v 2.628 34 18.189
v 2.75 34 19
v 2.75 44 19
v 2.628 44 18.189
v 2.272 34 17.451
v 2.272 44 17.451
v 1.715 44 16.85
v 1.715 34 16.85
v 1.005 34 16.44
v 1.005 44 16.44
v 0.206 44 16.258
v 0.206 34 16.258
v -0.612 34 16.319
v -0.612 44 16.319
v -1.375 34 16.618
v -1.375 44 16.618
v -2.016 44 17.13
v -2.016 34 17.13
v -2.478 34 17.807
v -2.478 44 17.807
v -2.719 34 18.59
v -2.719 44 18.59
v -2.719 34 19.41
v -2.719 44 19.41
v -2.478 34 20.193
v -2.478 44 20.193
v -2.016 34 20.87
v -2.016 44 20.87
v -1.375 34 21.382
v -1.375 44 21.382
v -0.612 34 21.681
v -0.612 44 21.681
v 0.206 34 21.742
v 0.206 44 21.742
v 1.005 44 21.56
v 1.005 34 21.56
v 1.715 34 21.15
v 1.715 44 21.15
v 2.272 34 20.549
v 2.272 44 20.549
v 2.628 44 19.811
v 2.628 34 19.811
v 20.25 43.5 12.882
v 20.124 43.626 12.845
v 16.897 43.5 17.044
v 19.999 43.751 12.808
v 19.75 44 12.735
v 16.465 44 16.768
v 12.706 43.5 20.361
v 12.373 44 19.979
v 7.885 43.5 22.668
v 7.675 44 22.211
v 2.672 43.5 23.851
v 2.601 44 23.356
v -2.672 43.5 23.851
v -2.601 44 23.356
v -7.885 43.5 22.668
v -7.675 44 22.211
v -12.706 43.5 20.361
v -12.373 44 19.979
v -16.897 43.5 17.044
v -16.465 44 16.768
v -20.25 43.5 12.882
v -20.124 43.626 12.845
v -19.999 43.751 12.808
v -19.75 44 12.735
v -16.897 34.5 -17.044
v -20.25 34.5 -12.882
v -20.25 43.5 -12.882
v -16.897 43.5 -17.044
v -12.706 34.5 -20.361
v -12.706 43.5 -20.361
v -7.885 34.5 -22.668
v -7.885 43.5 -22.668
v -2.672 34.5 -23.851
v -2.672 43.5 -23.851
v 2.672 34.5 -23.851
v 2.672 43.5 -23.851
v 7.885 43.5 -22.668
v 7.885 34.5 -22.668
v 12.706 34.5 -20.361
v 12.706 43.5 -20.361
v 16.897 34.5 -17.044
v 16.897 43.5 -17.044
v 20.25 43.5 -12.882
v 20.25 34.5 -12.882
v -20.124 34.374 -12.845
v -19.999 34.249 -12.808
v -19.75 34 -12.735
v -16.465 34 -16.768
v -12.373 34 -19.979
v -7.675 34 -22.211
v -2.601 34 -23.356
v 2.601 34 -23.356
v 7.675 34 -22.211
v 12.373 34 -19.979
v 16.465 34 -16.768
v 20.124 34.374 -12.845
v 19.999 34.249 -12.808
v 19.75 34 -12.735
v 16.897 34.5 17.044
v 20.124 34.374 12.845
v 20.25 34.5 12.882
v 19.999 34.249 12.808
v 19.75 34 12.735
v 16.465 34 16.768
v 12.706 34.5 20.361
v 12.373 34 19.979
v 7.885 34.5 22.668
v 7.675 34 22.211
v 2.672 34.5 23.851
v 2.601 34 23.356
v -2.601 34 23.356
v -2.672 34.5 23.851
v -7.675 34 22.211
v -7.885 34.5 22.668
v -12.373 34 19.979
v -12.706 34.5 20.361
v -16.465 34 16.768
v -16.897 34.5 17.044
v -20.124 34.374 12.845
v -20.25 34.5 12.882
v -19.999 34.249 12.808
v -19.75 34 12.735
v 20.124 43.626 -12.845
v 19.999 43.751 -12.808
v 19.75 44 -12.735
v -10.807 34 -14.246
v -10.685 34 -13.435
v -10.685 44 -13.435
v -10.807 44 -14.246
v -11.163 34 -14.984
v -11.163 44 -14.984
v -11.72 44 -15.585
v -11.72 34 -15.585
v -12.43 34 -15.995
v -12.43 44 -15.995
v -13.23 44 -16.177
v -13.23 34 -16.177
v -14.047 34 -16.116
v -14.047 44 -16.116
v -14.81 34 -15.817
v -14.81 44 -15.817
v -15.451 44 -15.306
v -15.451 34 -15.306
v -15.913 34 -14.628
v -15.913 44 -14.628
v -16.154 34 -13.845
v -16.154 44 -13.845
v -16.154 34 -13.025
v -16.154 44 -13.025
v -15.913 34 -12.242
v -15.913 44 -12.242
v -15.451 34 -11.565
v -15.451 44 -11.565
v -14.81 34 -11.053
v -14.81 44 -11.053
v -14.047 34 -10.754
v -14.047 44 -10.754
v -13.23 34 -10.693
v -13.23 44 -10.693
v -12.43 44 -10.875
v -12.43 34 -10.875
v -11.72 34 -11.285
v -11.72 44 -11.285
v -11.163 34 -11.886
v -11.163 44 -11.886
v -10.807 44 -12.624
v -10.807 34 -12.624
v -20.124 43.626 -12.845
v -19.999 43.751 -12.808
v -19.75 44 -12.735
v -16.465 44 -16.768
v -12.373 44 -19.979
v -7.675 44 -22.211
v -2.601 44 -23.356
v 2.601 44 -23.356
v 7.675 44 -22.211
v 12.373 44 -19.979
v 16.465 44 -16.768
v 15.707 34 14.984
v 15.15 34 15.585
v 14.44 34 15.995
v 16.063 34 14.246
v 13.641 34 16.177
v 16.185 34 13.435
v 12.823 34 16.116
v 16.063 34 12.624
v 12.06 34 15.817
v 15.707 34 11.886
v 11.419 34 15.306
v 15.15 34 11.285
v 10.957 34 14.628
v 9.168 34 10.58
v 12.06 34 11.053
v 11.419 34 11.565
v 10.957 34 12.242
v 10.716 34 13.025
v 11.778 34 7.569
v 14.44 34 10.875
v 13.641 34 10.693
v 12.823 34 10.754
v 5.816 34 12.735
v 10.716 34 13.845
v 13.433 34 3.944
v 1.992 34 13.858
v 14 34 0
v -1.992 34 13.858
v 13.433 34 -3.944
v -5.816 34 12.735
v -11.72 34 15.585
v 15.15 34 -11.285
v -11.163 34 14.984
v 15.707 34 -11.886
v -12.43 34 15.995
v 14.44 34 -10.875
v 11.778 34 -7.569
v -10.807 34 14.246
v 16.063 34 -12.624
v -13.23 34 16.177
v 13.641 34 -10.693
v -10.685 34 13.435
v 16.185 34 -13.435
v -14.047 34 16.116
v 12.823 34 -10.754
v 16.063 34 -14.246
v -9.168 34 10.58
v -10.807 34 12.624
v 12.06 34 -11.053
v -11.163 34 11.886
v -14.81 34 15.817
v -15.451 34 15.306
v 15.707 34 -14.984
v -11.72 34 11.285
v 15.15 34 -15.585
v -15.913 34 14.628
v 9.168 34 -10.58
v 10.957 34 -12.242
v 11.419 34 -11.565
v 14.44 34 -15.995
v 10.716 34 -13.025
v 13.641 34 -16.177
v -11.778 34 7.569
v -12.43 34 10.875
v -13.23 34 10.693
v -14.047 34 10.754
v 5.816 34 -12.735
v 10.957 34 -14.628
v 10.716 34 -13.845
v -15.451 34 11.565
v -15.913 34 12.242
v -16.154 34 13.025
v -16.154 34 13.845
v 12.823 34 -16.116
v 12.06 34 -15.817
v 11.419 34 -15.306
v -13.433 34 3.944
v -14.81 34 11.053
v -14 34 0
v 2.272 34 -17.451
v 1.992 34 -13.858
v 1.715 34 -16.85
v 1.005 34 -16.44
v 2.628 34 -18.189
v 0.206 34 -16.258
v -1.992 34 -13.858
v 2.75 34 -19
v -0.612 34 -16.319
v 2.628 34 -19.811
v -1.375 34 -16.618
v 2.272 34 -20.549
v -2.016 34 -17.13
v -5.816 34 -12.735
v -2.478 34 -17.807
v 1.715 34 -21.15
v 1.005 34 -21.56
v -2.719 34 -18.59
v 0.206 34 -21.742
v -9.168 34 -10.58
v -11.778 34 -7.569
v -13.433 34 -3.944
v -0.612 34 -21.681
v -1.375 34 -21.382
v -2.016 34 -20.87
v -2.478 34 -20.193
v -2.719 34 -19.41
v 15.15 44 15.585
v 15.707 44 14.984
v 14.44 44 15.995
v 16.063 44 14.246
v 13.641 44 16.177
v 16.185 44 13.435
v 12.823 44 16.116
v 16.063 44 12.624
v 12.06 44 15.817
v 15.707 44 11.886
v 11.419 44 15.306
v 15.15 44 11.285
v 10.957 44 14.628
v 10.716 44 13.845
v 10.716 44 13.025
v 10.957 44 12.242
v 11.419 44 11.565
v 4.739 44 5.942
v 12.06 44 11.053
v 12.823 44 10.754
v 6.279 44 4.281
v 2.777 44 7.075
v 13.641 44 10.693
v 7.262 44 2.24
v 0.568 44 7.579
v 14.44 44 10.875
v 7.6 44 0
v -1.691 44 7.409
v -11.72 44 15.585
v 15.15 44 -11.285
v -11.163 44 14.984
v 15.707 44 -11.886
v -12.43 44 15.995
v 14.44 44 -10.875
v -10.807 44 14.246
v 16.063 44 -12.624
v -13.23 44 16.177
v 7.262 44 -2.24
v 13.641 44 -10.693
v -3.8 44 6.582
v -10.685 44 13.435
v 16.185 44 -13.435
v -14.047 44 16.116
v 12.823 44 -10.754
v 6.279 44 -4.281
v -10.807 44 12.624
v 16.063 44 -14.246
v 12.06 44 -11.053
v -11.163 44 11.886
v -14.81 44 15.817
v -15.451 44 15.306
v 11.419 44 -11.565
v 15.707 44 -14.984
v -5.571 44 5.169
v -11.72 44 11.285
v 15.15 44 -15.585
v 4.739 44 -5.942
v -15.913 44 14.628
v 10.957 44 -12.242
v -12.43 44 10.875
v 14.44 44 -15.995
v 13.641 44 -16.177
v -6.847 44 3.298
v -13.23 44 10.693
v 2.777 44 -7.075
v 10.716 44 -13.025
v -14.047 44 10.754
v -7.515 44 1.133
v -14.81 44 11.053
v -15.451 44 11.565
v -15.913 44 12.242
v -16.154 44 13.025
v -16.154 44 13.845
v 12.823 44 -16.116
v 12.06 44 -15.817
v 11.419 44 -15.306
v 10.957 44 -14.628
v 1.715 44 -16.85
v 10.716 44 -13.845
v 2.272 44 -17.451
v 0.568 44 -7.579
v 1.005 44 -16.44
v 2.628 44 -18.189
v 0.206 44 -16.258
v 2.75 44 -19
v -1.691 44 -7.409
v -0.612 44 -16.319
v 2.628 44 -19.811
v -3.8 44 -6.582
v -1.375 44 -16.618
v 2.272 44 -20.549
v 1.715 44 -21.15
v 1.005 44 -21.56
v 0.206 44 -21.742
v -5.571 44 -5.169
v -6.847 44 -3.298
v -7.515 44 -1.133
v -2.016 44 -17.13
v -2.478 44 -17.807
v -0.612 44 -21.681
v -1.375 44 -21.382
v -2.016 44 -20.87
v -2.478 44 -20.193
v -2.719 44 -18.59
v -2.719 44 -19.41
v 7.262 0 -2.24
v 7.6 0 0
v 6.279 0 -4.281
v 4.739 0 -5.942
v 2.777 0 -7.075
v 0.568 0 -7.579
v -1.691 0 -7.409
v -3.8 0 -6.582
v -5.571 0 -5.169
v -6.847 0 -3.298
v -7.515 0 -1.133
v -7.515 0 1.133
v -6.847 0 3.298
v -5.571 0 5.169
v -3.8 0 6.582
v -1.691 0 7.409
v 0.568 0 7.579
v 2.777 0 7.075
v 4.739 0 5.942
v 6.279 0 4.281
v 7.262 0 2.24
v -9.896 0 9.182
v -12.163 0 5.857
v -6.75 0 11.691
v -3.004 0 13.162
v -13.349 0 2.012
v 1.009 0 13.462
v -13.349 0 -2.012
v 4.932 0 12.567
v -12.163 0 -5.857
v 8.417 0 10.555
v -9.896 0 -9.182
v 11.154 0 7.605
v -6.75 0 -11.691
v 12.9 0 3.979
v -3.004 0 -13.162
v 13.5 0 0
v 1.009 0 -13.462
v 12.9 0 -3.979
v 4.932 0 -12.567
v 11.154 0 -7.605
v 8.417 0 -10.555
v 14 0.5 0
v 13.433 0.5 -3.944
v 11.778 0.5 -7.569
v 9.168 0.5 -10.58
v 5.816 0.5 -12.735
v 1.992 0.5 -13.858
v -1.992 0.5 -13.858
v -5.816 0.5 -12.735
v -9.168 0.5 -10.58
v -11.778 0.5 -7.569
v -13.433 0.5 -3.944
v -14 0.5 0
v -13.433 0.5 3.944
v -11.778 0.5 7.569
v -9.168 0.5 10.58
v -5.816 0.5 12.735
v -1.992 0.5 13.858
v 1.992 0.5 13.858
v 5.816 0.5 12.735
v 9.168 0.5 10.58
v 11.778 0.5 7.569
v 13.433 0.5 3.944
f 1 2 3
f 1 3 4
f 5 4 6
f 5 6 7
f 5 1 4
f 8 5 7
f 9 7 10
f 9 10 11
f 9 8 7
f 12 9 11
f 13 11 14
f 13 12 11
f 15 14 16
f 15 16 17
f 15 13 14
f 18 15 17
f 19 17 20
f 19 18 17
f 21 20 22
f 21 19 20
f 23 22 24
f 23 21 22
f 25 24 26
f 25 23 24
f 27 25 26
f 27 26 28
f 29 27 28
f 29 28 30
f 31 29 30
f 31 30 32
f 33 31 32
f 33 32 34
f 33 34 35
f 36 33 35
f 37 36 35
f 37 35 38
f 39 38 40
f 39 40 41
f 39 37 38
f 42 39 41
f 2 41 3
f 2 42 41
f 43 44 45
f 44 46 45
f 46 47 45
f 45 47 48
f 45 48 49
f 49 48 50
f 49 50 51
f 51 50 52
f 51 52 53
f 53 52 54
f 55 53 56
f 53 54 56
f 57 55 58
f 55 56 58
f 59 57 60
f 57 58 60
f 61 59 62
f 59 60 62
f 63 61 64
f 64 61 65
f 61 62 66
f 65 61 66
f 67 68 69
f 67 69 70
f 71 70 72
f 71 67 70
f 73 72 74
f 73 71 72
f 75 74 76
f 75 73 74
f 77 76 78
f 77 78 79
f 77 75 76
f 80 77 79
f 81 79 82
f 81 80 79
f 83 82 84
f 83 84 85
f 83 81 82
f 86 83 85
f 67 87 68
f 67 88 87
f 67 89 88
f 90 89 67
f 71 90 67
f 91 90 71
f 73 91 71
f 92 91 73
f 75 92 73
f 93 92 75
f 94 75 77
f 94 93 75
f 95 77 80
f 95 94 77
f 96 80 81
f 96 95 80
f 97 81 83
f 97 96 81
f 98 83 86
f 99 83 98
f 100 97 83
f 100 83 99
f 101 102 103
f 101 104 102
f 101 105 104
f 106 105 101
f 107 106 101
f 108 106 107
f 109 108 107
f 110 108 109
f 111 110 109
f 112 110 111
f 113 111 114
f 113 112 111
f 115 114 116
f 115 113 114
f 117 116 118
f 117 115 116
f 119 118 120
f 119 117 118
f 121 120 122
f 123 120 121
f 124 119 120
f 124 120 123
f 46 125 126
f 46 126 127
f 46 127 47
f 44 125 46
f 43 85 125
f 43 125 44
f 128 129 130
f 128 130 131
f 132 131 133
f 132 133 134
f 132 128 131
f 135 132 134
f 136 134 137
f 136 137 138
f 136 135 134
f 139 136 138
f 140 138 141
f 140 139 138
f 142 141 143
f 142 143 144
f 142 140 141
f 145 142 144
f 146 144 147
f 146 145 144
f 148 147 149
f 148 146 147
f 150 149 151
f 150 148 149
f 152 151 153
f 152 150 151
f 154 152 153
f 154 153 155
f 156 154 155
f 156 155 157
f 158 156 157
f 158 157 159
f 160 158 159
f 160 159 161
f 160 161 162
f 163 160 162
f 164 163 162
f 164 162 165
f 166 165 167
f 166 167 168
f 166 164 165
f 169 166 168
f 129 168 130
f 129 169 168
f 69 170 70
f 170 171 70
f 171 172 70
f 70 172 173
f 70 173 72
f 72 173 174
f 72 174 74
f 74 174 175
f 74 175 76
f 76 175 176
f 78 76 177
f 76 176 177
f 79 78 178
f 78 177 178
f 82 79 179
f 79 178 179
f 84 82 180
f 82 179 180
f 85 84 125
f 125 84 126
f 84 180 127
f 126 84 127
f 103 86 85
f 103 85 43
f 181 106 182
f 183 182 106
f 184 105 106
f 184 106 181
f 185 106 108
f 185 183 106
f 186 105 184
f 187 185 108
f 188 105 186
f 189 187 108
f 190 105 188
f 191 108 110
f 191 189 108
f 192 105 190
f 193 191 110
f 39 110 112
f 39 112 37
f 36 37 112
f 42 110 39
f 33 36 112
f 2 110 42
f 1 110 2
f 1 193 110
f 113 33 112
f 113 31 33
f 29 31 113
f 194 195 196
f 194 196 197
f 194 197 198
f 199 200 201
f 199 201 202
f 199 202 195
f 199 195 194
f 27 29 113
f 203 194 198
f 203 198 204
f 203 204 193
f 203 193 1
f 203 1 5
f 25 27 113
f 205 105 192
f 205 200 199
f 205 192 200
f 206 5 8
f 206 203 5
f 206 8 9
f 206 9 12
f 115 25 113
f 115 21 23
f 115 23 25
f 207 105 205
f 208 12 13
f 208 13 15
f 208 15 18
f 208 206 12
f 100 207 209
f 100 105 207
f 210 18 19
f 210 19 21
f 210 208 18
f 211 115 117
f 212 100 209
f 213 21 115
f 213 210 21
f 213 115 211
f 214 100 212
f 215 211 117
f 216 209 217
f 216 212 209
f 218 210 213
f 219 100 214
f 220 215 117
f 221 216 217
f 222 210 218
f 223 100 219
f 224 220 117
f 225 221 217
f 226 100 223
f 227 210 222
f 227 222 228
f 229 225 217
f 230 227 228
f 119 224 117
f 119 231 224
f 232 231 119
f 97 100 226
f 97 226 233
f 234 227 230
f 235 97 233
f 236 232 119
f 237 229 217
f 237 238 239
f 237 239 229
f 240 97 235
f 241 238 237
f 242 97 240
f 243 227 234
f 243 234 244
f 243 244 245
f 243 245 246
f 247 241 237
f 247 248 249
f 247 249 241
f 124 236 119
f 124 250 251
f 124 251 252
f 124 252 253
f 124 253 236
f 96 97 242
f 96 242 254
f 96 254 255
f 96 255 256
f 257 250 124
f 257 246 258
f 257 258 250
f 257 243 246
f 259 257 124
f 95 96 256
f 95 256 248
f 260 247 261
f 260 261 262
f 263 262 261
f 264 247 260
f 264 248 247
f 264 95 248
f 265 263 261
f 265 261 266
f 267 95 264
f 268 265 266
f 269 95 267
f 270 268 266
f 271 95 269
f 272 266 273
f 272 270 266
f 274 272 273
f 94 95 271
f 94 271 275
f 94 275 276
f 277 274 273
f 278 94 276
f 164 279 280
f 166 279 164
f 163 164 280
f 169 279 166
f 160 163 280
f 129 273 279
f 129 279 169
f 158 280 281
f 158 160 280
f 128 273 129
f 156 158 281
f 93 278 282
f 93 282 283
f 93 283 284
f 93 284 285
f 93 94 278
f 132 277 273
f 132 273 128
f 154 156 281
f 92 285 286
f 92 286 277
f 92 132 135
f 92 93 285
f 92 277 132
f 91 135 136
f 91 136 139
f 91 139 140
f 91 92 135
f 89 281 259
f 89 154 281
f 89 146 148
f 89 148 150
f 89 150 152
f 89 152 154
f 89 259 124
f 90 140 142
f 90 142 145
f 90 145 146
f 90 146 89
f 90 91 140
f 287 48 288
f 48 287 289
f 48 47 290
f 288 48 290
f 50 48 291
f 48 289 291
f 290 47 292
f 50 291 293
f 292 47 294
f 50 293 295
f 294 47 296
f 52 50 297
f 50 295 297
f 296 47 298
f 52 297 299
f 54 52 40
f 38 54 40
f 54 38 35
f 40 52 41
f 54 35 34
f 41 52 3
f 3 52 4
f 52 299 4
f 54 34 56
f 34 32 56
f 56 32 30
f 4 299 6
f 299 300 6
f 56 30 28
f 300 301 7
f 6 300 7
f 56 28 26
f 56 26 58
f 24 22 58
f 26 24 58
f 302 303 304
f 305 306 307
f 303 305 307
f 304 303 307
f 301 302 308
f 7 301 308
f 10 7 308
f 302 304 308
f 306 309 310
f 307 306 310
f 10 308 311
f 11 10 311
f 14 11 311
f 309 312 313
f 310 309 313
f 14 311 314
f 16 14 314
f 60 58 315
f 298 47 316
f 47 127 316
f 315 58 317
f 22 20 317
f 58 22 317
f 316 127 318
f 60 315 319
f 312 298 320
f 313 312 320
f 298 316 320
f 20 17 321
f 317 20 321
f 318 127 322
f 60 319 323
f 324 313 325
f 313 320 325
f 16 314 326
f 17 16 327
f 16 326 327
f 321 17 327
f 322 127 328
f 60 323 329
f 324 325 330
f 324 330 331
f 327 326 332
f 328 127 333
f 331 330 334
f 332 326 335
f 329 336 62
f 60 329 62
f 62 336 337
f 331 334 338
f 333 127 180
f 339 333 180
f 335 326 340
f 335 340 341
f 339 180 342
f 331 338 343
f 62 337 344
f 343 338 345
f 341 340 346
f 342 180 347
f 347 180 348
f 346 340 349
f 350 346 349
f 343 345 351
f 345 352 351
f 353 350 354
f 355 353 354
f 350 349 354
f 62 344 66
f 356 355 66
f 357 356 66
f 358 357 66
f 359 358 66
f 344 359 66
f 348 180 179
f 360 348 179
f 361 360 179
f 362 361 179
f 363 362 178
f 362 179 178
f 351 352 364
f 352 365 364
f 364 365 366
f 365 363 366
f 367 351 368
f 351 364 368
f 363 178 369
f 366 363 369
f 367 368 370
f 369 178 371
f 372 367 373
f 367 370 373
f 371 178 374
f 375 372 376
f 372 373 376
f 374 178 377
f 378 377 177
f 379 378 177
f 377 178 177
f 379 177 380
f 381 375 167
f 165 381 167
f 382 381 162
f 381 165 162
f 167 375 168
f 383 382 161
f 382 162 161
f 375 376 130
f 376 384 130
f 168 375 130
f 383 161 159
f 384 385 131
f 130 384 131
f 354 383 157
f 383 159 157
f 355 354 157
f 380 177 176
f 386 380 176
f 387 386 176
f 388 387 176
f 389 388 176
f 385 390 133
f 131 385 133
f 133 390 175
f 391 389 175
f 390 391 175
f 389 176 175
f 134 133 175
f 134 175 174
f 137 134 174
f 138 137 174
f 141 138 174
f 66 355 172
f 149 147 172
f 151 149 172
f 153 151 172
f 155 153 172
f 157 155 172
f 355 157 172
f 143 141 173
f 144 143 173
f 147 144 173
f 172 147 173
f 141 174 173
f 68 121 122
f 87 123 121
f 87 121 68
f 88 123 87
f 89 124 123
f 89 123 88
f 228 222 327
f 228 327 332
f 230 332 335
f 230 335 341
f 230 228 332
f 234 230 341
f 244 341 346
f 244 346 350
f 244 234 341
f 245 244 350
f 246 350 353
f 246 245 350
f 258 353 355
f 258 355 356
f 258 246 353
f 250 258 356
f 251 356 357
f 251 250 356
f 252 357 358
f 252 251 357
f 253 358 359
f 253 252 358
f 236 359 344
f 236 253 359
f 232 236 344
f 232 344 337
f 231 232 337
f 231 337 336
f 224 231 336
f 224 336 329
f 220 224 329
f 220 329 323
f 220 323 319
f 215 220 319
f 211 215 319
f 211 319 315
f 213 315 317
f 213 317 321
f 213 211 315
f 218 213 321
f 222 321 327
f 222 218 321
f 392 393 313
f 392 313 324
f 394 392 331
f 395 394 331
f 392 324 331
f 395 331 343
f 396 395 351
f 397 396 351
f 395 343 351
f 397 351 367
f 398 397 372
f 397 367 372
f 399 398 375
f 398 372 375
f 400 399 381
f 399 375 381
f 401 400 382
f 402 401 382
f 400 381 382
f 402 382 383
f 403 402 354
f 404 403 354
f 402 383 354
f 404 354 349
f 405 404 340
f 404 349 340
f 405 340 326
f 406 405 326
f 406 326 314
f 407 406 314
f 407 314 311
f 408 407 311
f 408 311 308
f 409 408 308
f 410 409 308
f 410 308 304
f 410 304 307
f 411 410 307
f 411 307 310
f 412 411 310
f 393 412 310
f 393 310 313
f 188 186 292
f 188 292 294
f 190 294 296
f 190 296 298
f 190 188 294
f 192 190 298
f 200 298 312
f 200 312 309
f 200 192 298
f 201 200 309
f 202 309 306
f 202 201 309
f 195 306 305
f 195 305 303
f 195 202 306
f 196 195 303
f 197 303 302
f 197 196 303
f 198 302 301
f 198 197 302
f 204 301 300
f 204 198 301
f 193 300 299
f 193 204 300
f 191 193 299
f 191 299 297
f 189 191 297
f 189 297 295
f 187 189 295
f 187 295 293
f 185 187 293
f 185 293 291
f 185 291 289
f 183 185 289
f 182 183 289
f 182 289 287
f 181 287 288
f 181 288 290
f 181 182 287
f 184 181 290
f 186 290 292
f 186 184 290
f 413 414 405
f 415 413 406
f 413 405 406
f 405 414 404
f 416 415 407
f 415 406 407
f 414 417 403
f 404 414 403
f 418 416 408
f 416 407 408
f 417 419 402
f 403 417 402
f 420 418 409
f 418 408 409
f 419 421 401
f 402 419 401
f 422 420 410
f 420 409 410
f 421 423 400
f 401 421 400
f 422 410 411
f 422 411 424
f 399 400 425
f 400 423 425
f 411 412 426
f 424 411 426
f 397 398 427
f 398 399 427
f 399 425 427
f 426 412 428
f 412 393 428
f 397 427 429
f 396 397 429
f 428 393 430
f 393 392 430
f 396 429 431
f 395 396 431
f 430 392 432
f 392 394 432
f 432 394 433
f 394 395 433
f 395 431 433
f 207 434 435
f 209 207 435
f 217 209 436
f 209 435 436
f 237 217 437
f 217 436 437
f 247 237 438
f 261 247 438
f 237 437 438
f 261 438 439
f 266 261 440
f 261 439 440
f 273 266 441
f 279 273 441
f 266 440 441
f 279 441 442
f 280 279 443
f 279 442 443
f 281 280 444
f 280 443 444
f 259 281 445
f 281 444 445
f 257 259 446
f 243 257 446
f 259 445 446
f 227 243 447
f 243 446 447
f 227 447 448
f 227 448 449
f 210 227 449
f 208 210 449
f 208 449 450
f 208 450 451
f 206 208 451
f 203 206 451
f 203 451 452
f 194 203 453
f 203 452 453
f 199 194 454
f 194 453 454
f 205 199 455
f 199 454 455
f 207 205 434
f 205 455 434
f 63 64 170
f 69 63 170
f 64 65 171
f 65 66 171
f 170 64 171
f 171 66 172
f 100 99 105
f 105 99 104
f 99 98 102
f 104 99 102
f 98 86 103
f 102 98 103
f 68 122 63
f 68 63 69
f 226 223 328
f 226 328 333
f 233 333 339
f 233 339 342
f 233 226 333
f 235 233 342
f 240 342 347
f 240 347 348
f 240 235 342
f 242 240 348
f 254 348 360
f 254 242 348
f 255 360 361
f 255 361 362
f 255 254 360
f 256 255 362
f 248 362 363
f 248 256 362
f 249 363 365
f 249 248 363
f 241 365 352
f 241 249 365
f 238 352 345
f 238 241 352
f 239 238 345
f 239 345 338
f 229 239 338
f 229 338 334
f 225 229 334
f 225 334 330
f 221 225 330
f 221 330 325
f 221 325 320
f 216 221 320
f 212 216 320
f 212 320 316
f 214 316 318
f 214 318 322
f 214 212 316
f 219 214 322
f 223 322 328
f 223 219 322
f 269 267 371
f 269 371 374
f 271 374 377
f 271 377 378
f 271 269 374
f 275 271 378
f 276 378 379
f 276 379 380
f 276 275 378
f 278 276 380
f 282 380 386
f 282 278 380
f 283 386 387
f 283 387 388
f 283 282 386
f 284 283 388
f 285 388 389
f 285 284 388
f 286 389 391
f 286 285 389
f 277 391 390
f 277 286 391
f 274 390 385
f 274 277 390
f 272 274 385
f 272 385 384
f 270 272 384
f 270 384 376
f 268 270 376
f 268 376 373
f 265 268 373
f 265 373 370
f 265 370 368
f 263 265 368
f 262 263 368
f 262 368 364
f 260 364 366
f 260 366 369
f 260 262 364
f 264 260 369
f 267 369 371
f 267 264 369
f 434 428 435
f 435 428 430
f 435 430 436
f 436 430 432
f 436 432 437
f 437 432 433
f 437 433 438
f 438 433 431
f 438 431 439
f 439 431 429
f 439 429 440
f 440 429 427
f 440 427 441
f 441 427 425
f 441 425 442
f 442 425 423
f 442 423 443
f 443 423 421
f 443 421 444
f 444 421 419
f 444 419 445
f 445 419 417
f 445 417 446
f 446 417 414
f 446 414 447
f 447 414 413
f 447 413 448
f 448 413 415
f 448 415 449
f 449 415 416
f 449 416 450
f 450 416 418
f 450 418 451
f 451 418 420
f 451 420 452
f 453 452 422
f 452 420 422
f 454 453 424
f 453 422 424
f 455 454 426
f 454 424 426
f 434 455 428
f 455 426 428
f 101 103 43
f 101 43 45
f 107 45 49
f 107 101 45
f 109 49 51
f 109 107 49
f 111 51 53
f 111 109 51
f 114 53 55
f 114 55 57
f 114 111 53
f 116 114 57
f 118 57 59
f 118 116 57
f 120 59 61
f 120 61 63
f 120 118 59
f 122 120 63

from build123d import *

# Parameters (mm, degrees)
SKETCH_1_R          = 14
EXTRUDE_1_DEPTH     = 34
SKETCH_2_R          = 2.75
EXTRUDE_2_DEPTH     = 10
SKETCH_3_R          = 7.6
CUT_EXTRUDE_1_DEPTH = 45
CHAMFER_1_SIZE      = 0.5


with BuildPart() as part:
    # Эскиз1 → Бобышка-Вытянуть1 (new body)
    with BuildSketch(Plane(origin=(0, 0, 0), x_dir=(1, 0, 0), z_dir=(0, 1, 0))):
        Circle(SKETCH_1_R)
    extrude(amount=EXTRUDE_1_DEPTH)

    # Эскиз2 → Бобышка-Вытянуть2 (add)
    with BuildSketch(Plane(origin=(0, 34, 0), x_dir=(1, 0, 0), z_dir=(0, 1, 0))):
        with BuildLine():
            Line((-20.25, -12.881673028), (-20.25, 12.881673028))
            ThreePointArc((-20.25, 12.881673028), (0, 24), (20.25, 12.881673028))
            Line((20.25, 12.881673028), (20.25, -12.881673028))
            ThreePointArc((20.25, -12.881673028), (0, -24), (-20.25, -12.881673028))
        make_face()
        with Locations((0, 19)):
            Circle(SKETCH_2_R, mode=Mode.SUBTRACT)
        with Locations((13.435028843, 13.435028843)):
            Circle(SKETCH_2_R, mode=Mode.SUBTRACT)
        with Locations((13.435028843, -13.435028843)):
            Circle(SKETCH_2_R, mode=Mode.SUBTRACT)
        with Locations((0, -19)):
            Circle(SKETCH_2_R, mode=Mode.SUBTRACT)
        with Locations((-13.435028843, -13.435028843)):
            Circle(SKETCH_2_R, mode=Mode.SUBTRACT)
        with Locations((-13.435028843, 13.435028843)):
            Circle(SKETCH_2_R, mode=Mode.SUBTRACT)
    extrude(amount=EXTRUDE_2_DEPTH)

    # Эскиз3 → Вырез-Вытянуть1 (cut, through all)
    with BuildSketch(Plane(origin=(0, 44, 0), x_dir=(1, 0, 0), z_dir=(0, 1, 0))):
        Circle(SKETCH_3_R)
    extrude(amount=-CUT_EXTRUDE_1_DEPTH, mode=Mode.SUBTRACT)

    # Фаска1
    chamfer_1_edges = [part.edges().sort_by_distance(p)[0] for p in [
        (-14, 0, 0),
        (0, 44, -24),
        (-20.25, 44, 0),
        (0, 44, 24),
        (20.25, 44, 0),
        (0, 34, -24),
        (-20.25, 34, 0),
        (0, 34, 24),
        (20.25, 34, 0),
    ]]
    chamfer(chamfer_1_edges, length=CHAMFER_1_SIZE)


solid = part.part
